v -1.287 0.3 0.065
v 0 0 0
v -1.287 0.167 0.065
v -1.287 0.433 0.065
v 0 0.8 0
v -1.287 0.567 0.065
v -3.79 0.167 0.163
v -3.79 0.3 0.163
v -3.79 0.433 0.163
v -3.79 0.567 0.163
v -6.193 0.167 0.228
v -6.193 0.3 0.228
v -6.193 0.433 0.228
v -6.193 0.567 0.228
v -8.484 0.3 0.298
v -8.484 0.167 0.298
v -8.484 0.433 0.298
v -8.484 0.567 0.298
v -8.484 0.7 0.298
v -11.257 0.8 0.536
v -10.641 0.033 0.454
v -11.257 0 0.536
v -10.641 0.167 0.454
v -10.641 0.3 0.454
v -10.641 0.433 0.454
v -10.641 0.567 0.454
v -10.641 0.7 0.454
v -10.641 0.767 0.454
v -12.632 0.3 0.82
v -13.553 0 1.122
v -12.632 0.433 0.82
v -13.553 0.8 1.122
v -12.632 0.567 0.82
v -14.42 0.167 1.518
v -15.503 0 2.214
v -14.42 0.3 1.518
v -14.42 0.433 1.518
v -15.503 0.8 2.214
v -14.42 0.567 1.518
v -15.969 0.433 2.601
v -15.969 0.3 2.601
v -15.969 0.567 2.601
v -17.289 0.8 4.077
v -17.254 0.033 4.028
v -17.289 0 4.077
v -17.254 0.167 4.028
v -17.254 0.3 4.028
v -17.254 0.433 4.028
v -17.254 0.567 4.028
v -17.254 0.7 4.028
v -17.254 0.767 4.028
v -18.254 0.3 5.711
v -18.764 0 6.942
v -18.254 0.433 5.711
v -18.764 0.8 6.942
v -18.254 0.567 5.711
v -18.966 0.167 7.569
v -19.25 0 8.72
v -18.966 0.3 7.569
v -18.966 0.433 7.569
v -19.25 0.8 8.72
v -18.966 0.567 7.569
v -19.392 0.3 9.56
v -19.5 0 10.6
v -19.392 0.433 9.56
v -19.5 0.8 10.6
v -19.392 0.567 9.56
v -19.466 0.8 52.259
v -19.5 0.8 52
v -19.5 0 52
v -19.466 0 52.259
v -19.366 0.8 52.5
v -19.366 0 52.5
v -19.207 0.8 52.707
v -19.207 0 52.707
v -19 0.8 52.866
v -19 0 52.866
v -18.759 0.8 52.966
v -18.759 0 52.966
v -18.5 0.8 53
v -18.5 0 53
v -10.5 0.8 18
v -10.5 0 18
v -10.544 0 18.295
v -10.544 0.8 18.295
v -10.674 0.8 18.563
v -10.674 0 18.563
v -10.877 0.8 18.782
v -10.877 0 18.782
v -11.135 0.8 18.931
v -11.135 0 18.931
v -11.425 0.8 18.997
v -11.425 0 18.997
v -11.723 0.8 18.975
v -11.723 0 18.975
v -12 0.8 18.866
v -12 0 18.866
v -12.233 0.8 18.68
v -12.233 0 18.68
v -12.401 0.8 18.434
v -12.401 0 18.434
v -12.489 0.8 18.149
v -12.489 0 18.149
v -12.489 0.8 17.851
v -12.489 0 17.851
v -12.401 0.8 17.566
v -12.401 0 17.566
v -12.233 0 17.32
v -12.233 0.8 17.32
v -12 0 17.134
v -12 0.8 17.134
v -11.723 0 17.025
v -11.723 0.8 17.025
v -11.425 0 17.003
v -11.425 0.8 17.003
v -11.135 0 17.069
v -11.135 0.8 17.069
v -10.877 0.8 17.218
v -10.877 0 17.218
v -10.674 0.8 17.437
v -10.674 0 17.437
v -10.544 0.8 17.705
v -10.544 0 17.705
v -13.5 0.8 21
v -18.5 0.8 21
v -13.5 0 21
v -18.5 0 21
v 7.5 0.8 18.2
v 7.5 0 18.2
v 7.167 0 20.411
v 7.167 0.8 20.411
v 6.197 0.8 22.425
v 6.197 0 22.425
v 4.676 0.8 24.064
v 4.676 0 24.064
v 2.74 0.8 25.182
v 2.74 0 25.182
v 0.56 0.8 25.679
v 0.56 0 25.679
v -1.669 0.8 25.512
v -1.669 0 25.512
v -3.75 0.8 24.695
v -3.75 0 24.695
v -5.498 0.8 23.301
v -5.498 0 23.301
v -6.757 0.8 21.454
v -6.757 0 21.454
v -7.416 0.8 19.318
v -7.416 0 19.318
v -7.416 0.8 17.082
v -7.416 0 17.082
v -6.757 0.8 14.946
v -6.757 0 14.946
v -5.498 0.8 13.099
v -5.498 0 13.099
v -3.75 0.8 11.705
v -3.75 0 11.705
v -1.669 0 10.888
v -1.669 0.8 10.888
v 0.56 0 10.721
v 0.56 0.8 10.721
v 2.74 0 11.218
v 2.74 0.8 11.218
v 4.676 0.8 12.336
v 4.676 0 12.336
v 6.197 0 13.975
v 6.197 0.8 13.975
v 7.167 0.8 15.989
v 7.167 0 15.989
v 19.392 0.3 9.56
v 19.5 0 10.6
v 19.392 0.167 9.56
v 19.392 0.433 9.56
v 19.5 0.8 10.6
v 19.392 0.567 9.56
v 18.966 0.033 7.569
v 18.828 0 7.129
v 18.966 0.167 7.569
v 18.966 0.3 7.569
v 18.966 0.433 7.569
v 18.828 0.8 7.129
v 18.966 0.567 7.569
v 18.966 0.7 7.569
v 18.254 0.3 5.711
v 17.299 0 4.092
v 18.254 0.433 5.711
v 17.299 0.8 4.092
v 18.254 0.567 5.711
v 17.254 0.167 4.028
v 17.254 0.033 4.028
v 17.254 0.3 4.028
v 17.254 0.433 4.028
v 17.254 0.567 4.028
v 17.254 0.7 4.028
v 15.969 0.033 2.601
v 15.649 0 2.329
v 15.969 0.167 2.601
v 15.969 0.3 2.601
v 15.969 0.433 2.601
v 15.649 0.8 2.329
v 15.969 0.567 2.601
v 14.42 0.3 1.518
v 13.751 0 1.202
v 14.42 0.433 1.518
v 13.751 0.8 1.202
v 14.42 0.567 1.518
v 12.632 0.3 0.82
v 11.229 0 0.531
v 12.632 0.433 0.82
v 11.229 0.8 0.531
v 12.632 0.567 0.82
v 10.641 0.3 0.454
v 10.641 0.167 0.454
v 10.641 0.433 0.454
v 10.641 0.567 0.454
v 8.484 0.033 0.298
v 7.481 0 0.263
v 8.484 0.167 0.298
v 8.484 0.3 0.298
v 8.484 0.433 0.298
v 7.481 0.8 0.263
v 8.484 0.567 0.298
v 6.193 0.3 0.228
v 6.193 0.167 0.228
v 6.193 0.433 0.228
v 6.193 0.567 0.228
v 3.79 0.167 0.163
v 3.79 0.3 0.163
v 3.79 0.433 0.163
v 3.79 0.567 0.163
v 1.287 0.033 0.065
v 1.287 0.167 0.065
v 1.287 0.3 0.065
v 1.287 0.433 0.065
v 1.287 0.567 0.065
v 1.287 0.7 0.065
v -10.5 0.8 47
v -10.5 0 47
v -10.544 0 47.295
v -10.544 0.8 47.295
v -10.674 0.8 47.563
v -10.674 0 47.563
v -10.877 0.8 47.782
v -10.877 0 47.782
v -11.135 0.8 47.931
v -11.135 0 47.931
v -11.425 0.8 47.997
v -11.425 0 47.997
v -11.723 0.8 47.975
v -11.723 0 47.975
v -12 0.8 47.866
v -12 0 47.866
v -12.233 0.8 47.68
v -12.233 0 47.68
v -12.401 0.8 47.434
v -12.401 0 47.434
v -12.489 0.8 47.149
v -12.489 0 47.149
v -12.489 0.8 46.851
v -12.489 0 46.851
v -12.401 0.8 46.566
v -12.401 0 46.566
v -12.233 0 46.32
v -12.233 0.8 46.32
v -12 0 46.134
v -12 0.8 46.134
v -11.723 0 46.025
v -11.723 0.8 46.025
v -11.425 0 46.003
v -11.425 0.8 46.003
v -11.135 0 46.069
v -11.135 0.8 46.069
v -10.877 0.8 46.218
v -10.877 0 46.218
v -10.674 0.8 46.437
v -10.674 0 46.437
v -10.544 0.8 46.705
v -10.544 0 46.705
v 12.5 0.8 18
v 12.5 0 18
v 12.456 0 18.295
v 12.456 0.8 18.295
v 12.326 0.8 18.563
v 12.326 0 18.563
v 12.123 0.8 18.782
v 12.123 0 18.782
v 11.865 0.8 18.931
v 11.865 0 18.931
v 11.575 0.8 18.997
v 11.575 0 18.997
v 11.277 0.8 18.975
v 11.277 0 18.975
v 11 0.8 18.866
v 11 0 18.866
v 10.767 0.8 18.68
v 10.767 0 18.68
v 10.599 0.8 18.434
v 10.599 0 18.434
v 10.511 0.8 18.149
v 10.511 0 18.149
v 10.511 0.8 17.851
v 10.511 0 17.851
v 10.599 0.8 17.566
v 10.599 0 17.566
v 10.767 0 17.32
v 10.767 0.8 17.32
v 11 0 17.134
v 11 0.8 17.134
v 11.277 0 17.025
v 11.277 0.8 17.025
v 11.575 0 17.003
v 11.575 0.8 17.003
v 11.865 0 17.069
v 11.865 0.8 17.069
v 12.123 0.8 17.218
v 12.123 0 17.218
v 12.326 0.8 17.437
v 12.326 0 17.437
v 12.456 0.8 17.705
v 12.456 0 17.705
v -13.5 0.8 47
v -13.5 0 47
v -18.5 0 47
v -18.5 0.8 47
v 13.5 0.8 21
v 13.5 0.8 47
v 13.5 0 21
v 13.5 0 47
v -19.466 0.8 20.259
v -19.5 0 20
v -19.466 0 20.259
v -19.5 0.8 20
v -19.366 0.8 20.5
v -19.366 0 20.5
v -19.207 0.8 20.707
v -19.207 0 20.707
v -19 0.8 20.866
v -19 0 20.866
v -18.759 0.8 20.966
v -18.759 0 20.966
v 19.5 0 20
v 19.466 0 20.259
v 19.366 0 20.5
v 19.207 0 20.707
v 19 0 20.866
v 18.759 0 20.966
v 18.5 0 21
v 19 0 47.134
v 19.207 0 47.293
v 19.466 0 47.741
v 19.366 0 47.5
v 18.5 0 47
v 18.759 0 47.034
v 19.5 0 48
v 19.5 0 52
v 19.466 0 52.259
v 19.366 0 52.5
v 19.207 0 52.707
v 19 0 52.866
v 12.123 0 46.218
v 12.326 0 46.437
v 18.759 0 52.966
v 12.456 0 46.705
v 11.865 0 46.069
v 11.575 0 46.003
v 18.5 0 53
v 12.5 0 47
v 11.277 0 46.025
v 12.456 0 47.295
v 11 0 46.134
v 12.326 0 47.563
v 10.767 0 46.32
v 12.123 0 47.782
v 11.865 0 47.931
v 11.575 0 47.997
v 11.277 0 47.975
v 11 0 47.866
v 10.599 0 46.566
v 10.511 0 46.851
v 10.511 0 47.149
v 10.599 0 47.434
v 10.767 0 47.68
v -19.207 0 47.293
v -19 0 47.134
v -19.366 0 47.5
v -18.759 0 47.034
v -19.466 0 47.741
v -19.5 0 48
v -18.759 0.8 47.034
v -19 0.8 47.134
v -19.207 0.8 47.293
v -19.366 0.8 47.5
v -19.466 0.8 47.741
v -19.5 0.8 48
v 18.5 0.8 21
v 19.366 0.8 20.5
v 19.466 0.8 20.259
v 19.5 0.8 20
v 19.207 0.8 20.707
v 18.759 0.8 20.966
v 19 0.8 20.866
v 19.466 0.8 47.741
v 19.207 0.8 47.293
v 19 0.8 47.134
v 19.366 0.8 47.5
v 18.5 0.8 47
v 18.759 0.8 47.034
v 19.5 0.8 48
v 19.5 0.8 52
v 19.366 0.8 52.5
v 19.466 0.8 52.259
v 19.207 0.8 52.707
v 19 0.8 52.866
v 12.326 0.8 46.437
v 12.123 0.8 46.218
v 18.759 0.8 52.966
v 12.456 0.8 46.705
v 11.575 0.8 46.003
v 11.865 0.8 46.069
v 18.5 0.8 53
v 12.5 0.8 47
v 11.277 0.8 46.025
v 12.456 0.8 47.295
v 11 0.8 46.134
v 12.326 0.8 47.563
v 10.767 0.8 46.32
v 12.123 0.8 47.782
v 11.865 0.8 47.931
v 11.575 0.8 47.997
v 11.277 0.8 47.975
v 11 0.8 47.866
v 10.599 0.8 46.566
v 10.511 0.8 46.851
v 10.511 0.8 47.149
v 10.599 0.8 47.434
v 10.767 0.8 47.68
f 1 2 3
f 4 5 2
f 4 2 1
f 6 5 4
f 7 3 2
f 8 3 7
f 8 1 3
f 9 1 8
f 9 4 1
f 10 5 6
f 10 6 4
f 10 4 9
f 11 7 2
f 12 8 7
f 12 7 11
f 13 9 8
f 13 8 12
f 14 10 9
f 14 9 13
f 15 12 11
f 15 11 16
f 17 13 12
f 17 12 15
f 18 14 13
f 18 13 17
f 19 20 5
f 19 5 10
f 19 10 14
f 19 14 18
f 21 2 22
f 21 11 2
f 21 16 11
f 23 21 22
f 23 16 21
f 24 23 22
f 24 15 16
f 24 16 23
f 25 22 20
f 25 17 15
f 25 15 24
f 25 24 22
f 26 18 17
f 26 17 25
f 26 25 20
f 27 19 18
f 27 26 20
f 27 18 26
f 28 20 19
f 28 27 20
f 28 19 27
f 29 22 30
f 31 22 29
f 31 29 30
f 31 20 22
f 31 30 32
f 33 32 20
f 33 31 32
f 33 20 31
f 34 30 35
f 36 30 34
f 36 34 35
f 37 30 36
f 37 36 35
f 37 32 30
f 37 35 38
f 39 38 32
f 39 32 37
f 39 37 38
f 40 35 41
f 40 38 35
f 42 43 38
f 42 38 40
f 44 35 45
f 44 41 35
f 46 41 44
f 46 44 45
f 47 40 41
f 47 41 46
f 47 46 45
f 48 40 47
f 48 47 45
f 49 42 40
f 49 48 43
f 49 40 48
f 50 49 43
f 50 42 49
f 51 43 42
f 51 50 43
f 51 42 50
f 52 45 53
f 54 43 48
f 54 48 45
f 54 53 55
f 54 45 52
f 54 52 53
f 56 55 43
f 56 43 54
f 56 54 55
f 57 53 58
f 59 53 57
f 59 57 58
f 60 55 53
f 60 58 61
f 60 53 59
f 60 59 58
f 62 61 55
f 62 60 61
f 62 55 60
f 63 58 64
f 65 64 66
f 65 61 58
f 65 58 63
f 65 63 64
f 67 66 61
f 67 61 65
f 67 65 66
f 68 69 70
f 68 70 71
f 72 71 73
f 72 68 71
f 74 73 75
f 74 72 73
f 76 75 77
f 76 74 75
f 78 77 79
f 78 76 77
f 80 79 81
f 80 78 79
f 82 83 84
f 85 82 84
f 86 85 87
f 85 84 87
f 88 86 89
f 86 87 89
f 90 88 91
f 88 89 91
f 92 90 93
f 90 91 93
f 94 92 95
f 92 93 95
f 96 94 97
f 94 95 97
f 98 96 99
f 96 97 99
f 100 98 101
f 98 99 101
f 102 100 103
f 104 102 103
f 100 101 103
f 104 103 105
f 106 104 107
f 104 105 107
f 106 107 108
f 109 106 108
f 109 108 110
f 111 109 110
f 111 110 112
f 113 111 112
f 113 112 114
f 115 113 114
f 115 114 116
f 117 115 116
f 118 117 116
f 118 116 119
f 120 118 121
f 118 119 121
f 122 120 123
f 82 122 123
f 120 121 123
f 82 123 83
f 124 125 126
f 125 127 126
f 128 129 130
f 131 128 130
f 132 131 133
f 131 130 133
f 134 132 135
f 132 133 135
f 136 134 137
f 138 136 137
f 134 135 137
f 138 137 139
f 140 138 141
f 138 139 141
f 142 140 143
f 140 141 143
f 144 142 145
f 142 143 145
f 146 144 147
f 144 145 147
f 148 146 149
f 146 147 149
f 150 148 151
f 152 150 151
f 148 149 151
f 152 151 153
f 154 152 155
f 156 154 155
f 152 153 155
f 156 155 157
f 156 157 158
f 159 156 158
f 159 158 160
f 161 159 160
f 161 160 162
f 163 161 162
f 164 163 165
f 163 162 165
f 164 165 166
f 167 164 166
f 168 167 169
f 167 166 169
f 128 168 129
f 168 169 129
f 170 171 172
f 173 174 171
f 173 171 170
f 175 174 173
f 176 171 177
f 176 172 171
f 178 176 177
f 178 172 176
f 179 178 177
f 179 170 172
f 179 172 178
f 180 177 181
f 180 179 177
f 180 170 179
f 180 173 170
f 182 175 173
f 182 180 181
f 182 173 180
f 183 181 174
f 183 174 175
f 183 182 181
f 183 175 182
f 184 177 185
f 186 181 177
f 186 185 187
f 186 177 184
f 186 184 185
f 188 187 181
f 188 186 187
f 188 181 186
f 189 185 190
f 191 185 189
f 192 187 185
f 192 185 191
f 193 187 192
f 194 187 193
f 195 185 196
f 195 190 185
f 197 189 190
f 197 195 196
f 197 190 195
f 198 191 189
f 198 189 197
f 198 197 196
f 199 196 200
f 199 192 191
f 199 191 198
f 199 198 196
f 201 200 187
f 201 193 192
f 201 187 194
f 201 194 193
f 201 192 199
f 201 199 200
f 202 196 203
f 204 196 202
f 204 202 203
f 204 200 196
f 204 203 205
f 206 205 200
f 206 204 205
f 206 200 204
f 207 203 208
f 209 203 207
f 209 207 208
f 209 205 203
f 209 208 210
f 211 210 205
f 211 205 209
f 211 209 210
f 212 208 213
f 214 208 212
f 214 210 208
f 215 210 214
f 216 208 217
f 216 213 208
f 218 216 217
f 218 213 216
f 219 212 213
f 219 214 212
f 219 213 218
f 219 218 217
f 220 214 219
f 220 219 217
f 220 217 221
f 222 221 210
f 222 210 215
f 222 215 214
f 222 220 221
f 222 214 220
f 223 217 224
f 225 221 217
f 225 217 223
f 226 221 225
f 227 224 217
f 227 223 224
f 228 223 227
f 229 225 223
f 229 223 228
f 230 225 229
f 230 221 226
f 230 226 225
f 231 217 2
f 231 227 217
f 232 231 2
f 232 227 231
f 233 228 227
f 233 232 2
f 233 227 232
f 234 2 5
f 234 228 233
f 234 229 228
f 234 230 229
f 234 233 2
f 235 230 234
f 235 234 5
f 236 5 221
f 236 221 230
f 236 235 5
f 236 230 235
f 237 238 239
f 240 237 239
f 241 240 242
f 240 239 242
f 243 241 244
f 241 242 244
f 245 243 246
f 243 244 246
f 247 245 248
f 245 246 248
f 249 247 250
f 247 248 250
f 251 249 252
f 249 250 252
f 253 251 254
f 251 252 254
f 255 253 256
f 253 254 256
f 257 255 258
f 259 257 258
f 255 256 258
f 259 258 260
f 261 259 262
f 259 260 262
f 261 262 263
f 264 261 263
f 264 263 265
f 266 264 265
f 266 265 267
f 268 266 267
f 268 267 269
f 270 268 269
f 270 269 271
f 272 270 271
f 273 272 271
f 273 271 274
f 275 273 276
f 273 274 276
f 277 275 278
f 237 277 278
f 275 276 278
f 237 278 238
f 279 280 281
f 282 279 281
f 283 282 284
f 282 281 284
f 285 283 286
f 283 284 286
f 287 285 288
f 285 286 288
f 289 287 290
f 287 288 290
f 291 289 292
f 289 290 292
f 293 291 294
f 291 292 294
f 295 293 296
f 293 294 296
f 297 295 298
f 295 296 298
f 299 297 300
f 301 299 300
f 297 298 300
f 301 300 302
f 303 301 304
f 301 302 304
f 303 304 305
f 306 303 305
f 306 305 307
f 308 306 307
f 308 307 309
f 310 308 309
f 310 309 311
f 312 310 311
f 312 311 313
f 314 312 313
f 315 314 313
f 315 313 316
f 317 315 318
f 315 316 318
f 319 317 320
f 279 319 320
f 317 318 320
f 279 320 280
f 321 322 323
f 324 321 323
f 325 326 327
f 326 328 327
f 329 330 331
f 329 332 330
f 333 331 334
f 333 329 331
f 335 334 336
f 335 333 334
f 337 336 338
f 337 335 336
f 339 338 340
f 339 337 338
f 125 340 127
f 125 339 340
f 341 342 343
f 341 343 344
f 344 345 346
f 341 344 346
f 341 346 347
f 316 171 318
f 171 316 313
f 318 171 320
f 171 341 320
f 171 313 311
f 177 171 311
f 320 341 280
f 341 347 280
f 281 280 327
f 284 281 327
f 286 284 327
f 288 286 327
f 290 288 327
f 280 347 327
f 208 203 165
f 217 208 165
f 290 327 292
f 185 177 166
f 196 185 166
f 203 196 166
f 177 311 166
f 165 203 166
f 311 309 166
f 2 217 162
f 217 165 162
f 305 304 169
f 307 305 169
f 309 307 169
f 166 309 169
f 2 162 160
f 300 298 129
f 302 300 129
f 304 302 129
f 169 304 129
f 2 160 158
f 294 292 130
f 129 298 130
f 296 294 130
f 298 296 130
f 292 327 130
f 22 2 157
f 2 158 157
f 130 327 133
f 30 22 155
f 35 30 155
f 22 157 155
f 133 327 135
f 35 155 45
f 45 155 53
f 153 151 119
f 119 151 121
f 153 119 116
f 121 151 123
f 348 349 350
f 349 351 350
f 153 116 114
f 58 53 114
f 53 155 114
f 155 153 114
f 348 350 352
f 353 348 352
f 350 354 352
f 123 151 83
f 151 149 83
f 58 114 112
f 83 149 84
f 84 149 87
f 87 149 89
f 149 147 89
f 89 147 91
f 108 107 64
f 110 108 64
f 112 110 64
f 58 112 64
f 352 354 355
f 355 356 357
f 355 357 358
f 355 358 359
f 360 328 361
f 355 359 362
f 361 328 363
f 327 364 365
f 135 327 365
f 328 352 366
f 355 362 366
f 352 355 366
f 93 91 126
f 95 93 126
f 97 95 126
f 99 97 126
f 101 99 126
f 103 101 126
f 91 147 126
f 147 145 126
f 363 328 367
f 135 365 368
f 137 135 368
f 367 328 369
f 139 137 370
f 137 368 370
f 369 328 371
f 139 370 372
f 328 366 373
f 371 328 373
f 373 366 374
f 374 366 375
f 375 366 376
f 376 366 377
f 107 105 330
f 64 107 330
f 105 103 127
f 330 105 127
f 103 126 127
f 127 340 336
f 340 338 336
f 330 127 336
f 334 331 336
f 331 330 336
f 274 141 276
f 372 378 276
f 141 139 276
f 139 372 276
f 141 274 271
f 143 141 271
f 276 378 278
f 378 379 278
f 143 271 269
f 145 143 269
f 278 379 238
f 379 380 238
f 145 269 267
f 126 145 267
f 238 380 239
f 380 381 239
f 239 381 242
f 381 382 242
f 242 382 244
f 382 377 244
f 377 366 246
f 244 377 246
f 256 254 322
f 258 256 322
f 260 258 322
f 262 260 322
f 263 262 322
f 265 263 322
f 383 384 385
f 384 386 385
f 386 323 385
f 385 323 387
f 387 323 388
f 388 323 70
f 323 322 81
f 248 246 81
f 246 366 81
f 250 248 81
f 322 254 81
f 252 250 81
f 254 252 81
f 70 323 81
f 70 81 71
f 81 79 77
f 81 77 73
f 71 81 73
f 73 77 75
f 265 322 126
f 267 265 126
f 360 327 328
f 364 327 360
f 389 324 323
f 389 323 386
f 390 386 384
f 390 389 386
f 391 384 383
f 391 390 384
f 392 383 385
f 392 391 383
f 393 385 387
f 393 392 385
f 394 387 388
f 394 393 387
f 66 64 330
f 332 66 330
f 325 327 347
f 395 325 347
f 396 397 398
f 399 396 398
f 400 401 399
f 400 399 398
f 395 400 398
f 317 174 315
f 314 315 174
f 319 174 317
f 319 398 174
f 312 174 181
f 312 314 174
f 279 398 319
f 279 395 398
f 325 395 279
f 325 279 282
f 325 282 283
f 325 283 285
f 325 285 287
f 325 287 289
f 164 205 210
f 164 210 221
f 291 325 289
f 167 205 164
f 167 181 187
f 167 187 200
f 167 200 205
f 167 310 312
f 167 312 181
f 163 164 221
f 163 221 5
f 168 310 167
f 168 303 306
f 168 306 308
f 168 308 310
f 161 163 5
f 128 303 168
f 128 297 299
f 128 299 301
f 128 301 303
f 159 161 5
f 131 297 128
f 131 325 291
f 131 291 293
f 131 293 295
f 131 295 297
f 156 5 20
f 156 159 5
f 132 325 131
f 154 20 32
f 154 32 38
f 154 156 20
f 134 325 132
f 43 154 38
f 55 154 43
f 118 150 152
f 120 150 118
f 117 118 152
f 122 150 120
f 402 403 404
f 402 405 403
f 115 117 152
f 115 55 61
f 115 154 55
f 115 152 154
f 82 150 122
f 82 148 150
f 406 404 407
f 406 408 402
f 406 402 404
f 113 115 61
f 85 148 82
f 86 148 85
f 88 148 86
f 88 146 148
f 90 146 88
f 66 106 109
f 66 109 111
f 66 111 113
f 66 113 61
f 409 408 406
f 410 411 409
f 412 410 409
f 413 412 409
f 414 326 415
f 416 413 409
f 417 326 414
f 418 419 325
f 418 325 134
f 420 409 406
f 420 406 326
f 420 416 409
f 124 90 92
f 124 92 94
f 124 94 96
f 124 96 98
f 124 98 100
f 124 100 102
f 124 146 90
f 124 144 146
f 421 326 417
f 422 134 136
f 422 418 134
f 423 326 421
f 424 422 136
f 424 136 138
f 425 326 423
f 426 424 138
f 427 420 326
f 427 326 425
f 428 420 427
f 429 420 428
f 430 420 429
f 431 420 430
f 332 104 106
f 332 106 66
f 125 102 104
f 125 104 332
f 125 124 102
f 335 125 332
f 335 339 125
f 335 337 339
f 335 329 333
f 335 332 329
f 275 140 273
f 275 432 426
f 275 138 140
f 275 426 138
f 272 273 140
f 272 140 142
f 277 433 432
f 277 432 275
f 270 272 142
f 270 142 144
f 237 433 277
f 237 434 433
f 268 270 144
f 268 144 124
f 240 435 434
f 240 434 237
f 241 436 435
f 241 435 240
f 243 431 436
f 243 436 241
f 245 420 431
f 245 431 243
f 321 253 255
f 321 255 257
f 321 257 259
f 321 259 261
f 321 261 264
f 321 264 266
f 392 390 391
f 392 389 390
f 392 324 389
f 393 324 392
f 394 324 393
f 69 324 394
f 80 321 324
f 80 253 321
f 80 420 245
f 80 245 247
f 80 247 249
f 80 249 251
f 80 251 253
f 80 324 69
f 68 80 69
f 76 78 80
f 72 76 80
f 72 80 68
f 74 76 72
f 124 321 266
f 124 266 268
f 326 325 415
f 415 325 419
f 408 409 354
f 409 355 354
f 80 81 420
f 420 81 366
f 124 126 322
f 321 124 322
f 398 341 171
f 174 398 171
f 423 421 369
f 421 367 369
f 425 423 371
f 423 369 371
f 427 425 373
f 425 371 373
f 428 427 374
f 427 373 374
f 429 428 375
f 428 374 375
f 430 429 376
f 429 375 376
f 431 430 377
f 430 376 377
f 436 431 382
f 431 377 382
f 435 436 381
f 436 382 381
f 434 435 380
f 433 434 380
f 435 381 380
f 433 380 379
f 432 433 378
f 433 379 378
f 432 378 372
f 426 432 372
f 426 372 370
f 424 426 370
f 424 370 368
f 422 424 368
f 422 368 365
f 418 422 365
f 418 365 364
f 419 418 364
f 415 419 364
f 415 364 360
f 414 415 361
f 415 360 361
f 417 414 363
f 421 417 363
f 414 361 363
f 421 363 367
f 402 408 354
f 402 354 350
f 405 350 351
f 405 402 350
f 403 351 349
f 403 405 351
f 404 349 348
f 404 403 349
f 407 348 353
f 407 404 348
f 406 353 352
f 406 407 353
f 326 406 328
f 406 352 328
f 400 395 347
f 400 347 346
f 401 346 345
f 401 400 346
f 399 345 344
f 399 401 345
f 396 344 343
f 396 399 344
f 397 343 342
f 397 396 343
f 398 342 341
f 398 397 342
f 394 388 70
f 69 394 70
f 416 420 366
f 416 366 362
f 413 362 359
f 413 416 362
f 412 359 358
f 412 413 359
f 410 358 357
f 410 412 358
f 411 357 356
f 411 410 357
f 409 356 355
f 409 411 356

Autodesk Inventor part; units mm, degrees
ref_plane "YZ Plane" through (0, 0, 0) normal (1, 0, 0) x (0, 1, 0)
ref_plane "XZ Plane" through (0, 0, 0) normal (0, 1, 0) x (-1, 0, 0)
ref_plane "XY Plane" through (0, 0, 0) normal (0, 0, 1) x (1, 0, 0)
sketch "スケッチ1" plane through (0, 0, 0) normal (0, 1, 0) x (-1, 0, 0)
  line L0 (-13.5, 21) -> (-19.5, 21)
  line L1 (-19.5, 21) -> (-19.5, 0)
  line L2 (-19.5, 0) -> (19.5, 0)
  line L3 (19.5, 0) -> (19.5, 21)
  line L4 (19.5, 21) -> (13.5, 21)
  line L5 (13.5, 21) -> (13.5, 47)
  line L6 (13.5, 47) -> (19.5, 47)
  line L7 (19.5, 47) -> (19.5, 53)
  line L8 (19.5, 53) -> (-19.5, 53)
  line L9 (-19.5, 53) -> (-19.5, 47)
  line L10 (-19.5, 47) -> (-13.5, 47)
  line L11 (-13.5, 47) -> (-13.5, 21)
  point P0 (0, 0)
  point P1 (0, 0)
  dimension "d5" = 39
  dimension "d6" = 27
  dimension "d8" = 26
  dimension "d16" = 6
  dimension "d43" = 53
  dimension "d44" = 39
extrude "Body" add sketch "スケッチ1" along normal blind 0.8
fillet "フィレット1" radius 1 6 edges at (19.5, 0.4, 53) (19.5, 0.4, 47) (19.5, 0.4, 21) (-19.5, 0.4, 21) (-19.5, 0.4, 53) (-19.5, 0.4, 47)
sketch "スケッチ6" plane through (0, 0, 0) normal (0, -1, 0) x (1, 0, 0)
  circle A0 centre (0, 18.2) radius 7.5
  line L0 (19.5, 0) -> (-19.5, 0) projected
  circle A1 centre (0, 18.2) radius 10
  point P0 (0, 0)
  point P1 (0, 0)
  dimension "d27" = 15
  dimension "d28" = 20
  dimension "d31" = 18.2
extrude "押し出し4" cut sketch "スケッチ6" against normal through all contours A0
sketch "スケッチ7" plane through (0, 0.8, 0) normal (0, 1, 0) x (1, 0, 0)
  spline S0 degree 5 poles (0, 0) (-0.3117, -0.0168) (-0.9317, -0.0488) (-1.8515, -0.0923) (-3.0577, -0.1409) (-4.5307, -0.1873) (-5.9672, -0.223) (-7.3645, -0.2562) (-8.7185, -0.3001) (-10.0237, -0.3761) (-11.2732, -0.5129) (-12.4592, -0.7408) (-13.5734, -1.0876) (-14.6076, -1.5729) (-15.5546, -2.2027) (-16.4082, -2.9673) (-17.1633, -3.8489) (-17.8162, -4.8254) (-18.3648, -5.8755) (-18.8088, -6.9843) (-19.1492, -8.1424) (-19.3399, -9.1044) (-19.4375, -9.8448) (-19.4825, -10.3469) (-19.5, -10.6) knots 0 0 0 0 0 0 0.05 0.1 0.15 0.2 0.25 0.3 0.35 0.4 0.45 0.5 0.55 0.6 0.65 0.7 0.75 0.8 0.85 0.9 0.95 1 1 1 1 1 1
  spline S1 degree 5 poles (19.5, -10.6) (19.4825, -10.3469) (19.4375, -9.8448) (19.3399, -9.1043) (19.1492, -8.1424) (18.8088, -6.9842) (18.3648, -5.8755) (17.8162, -4.8253) (17.1633, -3.8489) (16.4081, -2.9673) (15.5546, -2.2027) (14.6076, -1.5729) (13.5734, -1.0876) (12.4592, -0.7408) (11.2732, -0.5129) (10.0237, -0.3762) (8.7184, -0.3002) (7.3644, -0.2562) (5.9671, -0.2231) (4.5306, -0.1873) (3.0577, -0.141) (1.8515, -0.0923) (0.9316, -0.0489) (0.3116, -0.0169) (0, 0) knots -1 -1 -1 -1 -1 -1 -0.95 -0.9 -0.85 -0.8 -0.75 -0.7 -0.65 -0.6 -0.55 -0.5 -0.45 -0.4 -0.35 -0.3 -0.25 -0.2 -0.15 -0.1 -0.05 0 0 0 0 0 0
  line L0 (19.5, -10.6) -> (19.5, -53)
  line L1 (19.5, -53) -> (-19.5, -53)
  line L2 (-19.5, -53) -> (-19.5, -10.6)
  line L3 (-18.5, -53) -> (18.5, -53) projected
  line L4 (19.5, 0) -> (-19.5, 0) projected
  point P0 (0, -53)
  dimension "d40" = 53
  dimension "d45" = 39
  dimension "d47" = 10.6
extrude "押し出し5" cut sketch "スケッチ7" against normal through all keep common part
sketch "スケッチ9" plane through (0, 0, 0) normal (0, -1, 0) x (1, 0, 0)
  circle A0 centre (-11.5, 47) radius 1
  circle A1 centre (-11.5, 47) radius 1
  circle A2 centre (-11.5, 18) radius 1
  line L0 (0, 0) -> (0, 53)
  circle A3 centre (11.5, 47) radius 1
  circle A4 centre (11.5, 47) radius 1
  circle A5 centre (11.5, 18) radius 1
  line L1 (-18.5, 53) -> (18.5, 53) projected
  circle A6 centre (0, 18.2) radius 7.5 projected
  line L2 (19.5, 20) -> (19.5, 10.6) projected
  arc A7 (19.5, 20) -> (18.5, 21) centre (18.5, 20) ccw projected
  line L3 (13.5, 21) -> (18.5, 21) projected
  line L4 (13.5, 47) -> (13.5, 21) projected
  line L5 (18.5, 47) -> (13.5, 47) projected
  arc A8 (18.5, 47) -> (19.5, 48) centre (18.5, 48) ccw projected
  line L6 (19.5, 52) -> (19.5, 48) projected
  arc A9 (19.5, 52) -> (18.5, 53) centre (18.5, 52) ccw projected
  line L7 (-18.5, 53) -> (18.5, 53) projected
  arc A10 (-18.5, 53) -> (-19.5, 52) centre (-18.5, 52) ccw projected
  line L8 (-19.5, 48) -> (-19.5, 52) projected
  arc A11 (-19.5, 48) -> (-18.5, 47) centre (-18.5, 48) ccw projected
  line L9 (-13.5, 47) -> (-18.5, 47) projected
  line L10 (-13.5, 21) -> (-13.5, 47) projected
  line L11 (-18.5, 21) -> (-13.5, 21) projected
  arc A12 (-18.5, 21) -> (-19.5, 20) centre (-18.5, 20) ccw projected
  line L12 (-19.5, 10.6) -> (-19.5, 20) projected
  dimension "d52" = 2
  dimension "d53" = 29
  dimension "d55" = 2
extrude "押し出し7" cut sketch "スケッチ9" against normal through all contours A0 | A2 | A3 | A5
ref_plane "作業平面1" through (13.5, 0, 34) normal (0, 0, -1) x (-1, 0, 0)
properties part number "MainBoard"
